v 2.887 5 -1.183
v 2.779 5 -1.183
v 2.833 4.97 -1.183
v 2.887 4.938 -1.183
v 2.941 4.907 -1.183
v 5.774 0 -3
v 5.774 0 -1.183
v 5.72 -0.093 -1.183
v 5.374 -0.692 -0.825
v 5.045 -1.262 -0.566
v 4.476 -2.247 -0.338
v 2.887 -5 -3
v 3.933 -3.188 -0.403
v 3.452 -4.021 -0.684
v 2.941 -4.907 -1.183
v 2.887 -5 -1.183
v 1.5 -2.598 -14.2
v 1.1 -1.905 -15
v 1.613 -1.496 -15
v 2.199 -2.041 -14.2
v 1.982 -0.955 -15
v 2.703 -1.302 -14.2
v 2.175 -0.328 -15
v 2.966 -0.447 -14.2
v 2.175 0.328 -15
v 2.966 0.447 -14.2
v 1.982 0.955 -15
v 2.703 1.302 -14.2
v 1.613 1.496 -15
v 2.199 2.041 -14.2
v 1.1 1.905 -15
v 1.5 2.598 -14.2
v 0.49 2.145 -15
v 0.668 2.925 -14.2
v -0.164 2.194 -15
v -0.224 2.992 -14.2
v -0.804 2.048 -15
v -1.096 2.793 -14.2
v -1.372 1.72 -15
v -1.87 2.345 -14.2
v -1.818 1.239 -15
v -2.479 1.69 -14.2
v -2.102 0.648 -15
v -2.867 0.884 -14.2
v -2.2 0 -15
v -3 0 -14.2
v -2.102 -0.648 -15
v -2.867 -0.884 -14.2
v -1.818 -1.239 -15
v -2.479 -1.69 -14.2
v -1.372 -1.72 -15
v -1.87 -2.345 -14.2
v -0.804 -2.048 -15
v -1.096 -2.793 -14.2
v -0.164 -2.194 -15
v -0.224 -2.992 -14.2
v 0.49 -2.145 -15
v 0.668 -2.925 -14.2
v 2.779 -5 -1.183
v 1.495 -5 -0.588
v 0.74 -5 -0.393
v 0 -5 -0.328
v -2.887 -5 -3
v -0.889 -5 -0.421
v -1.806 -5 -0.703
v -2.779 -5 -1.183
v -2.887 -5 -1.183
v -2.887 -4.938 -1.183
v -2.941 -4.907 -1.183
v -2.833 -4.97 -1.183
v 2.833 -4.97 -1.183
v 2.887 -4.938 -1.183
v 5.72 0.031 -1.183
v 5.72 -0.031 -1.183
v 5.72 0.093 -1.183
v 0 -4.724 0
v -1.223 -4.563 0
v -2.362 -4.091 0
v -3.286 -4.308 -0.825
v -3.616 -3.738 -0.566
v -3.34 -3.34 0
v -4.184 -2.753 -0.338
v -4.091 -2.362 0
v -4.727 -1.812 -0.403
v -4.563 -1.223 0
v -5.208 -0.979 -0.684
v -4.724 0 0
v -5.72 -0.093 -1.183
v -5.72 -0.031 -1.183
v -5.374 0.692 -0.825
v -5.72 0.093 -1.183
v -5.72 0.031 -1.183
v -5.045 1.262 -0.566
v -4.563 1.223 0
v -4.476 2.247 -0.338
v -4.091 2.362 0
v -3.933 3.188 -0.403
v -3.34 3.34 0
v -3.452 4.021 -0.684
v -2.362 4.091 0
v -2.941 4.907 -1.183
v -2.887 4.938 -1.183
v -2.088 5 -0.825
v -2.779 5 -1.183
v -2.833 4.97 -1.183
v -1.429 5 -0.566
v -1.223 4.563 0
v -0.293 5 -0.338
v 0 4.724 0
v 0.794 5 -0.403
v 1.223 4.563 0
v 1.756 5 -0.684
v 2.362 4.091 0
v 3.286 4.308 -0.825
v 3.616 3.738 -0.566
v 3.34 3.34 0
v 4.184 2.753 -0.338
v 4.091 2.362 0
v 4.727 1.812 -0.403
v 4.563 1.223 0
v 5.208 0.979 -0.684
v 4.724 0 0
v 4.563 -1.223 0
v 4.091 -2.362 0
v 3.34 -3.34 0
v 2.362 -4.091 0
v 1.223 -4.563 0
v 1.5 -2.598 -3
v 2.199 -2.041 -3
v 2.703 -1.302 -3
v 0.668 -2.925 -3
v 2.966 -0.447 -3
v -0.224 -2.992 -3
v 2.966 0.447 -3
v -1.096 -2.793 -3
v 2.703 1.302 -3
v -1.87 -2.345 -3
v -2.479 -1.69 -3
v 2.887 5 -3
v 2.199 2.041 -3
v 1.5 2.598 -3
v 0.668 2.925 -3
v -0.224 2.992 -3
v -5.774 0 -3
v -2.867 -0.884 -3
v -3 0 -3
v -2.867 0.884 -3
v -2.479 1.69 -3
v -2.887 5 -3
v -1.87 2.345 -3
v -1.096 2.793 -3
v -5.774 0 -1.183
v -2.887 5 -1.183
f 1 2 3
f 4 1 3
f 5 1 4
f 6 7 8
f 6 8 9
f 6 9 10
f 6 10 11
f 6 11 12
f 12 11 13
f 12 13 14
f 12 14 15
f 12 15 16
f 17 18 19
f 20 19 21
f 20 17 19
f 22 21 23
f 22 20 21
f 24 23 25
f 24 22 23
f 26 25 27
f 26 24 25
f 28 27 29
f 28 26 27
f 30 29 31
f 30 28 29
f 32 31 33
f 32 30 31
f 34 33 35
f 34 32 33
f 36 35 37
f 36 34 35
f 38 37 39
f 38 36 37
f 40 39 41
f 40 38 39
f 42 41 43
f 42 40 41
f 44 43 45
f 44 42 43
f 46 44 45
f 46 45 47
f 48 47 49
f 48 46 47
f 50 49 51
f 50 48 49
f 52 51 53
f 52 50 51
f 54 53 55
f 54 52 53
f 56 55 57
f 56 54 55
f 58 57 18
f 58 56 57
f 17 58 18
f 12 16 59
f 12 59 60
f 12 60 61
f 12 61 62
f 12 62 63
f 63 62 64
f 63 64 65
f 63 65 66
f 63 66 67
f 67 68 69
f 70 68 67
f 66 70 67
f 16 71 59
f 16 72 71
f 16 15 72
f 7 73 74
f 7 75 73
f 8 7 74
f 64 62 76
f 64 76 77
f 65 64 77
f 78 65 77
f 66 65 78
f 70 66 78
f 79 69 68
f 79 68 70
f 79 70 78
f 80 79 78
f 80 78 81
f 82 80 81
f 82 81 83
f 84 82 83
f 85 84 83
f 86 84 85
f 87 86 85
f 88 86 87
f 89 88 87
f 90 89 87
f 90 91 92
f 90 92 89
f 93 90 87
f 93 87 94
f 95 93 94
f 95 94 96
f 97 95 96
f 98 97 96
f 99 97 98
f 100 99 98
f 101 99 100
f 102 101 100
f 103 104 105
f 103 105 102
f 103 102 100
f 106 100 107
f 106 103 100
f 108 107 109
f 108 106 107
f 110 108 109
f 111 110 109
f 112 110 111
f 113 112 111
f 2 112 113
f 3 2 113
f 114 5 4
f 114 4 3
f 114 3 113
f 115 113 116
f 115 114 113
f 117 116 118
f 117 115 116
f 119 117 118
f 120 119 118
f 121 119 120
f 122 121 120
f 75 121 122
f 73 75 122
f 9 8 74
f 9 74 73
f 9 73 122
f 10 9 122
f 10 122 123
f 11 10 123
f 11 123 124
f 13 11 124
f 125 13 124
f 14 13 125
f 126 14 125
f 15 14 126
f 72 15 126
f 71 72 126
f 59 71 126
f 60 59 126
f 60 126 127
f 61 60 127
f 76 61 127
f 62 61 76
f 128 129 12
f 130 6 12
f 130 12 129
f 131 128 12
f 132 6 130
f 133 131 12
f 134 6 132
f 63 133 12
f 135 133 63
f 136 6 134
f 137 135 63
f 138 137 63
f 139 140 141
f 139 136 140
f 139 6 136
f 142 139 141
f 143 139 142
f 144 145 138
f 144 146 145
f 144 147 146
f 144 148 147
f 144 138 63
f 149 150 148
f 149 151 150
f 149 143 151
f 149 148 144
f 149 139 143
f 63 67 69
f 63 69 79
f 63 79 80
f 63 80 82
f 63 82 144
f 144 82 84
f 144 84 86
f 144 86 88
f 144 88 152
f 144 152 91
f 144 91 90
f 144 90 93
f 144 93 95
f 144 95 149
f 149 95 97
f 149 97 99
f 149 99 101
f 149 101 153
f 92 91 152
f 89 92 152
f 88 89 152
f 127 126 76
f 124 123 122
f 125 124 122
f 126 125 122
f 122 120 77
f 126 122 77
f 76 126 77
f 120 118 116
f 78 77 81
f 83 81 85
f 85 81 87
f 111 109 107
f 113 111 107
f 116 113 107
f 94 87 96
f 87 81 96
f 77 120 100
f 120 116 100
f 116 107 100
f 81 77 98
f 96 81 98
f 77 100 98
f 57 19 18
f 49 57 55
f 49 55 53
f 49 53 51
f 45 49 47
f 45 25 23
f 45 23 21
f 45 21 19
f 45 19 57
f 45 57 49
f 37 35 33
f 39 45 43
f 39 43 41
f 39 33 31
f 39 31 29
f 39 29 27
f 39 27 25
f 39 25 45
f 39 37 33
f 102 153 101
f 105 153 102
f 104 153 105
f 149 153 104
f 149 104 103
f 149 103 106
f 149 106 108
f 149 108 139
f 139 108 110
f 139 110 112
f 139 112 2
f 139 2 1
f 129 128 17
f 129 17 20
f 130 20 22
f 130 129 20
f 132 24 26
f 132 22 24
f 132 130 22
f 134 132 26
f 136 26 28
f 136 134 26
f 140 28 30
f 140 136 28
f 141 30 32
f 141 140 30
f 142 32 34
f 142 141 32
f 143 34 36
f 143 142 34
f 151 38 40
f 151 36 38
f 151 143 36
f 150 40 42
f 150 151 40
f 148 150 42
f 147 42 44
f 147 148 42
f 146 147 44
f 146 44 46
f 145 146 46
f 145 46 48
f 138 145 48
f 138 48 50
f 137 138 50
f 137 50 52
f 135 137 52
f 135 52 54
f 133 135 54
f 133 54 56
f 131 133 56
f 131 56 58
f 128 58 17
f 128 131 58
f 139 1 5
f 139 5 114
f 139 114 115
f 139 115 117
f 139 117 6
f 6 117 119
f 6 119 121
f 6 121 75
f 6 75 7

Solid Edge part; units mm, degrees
sketch "Sketch1" plane through (0, 0, 0) normal (0, 0, -1) x (-1, 0, 0)
  line L0 (-2.8868, 5) -> (-5.7735, 0)
  line L1 (-5.7735, 0) -> (-2.8868, -5)
  line L2 (-2.8868, -5) -> (2.8868, -5)
  line L3 (2.8868, -5) -> (5.7735, 0)
  line L4 (5.7735, 0) -> (2.8868, 5)
  line L5 (2.8868, 5) -> (-2.8868, 5)
extrude "Protrusion1" add sketch "Sketch1" along normal blind 3
sketch "Sketch2" plane through (0, 0, -3) normal (0, 0, -1) x (0.5, -0.866, 0)
  circle A0 centre (0, 0) radius 3
extrude "Kihúzás_2" add sketch "Sketch2" along normal blind 12
chamfer "Letörés_1" distance 0.8 angle 45 1 edges at (-1.5, 2.5981, -15)
cosmetic_thread "Thread1" size "M6"
sketch "Sketch3" plane through (0, 0, 0) normal (-1, 0, 0) x (0, -1, 0)
  line L0 (3.7699, 1.1319) -> (5.7205, -1.1833)
  line L1 (5.7205, -1.1833) -> (13.1885, -1.1833)
  line L2 (13.1885, -1.1833) -> (13.1885, 2.2239)
  line L3 (13.1885, 2.2239) -> (3.7699, 1.1319)
revolve "RevolvedCutout1" cut sketch "Sketch3" angle 360 about axis through (0, 0, 0) along (0, 0, 1)
properties material "Acél"
